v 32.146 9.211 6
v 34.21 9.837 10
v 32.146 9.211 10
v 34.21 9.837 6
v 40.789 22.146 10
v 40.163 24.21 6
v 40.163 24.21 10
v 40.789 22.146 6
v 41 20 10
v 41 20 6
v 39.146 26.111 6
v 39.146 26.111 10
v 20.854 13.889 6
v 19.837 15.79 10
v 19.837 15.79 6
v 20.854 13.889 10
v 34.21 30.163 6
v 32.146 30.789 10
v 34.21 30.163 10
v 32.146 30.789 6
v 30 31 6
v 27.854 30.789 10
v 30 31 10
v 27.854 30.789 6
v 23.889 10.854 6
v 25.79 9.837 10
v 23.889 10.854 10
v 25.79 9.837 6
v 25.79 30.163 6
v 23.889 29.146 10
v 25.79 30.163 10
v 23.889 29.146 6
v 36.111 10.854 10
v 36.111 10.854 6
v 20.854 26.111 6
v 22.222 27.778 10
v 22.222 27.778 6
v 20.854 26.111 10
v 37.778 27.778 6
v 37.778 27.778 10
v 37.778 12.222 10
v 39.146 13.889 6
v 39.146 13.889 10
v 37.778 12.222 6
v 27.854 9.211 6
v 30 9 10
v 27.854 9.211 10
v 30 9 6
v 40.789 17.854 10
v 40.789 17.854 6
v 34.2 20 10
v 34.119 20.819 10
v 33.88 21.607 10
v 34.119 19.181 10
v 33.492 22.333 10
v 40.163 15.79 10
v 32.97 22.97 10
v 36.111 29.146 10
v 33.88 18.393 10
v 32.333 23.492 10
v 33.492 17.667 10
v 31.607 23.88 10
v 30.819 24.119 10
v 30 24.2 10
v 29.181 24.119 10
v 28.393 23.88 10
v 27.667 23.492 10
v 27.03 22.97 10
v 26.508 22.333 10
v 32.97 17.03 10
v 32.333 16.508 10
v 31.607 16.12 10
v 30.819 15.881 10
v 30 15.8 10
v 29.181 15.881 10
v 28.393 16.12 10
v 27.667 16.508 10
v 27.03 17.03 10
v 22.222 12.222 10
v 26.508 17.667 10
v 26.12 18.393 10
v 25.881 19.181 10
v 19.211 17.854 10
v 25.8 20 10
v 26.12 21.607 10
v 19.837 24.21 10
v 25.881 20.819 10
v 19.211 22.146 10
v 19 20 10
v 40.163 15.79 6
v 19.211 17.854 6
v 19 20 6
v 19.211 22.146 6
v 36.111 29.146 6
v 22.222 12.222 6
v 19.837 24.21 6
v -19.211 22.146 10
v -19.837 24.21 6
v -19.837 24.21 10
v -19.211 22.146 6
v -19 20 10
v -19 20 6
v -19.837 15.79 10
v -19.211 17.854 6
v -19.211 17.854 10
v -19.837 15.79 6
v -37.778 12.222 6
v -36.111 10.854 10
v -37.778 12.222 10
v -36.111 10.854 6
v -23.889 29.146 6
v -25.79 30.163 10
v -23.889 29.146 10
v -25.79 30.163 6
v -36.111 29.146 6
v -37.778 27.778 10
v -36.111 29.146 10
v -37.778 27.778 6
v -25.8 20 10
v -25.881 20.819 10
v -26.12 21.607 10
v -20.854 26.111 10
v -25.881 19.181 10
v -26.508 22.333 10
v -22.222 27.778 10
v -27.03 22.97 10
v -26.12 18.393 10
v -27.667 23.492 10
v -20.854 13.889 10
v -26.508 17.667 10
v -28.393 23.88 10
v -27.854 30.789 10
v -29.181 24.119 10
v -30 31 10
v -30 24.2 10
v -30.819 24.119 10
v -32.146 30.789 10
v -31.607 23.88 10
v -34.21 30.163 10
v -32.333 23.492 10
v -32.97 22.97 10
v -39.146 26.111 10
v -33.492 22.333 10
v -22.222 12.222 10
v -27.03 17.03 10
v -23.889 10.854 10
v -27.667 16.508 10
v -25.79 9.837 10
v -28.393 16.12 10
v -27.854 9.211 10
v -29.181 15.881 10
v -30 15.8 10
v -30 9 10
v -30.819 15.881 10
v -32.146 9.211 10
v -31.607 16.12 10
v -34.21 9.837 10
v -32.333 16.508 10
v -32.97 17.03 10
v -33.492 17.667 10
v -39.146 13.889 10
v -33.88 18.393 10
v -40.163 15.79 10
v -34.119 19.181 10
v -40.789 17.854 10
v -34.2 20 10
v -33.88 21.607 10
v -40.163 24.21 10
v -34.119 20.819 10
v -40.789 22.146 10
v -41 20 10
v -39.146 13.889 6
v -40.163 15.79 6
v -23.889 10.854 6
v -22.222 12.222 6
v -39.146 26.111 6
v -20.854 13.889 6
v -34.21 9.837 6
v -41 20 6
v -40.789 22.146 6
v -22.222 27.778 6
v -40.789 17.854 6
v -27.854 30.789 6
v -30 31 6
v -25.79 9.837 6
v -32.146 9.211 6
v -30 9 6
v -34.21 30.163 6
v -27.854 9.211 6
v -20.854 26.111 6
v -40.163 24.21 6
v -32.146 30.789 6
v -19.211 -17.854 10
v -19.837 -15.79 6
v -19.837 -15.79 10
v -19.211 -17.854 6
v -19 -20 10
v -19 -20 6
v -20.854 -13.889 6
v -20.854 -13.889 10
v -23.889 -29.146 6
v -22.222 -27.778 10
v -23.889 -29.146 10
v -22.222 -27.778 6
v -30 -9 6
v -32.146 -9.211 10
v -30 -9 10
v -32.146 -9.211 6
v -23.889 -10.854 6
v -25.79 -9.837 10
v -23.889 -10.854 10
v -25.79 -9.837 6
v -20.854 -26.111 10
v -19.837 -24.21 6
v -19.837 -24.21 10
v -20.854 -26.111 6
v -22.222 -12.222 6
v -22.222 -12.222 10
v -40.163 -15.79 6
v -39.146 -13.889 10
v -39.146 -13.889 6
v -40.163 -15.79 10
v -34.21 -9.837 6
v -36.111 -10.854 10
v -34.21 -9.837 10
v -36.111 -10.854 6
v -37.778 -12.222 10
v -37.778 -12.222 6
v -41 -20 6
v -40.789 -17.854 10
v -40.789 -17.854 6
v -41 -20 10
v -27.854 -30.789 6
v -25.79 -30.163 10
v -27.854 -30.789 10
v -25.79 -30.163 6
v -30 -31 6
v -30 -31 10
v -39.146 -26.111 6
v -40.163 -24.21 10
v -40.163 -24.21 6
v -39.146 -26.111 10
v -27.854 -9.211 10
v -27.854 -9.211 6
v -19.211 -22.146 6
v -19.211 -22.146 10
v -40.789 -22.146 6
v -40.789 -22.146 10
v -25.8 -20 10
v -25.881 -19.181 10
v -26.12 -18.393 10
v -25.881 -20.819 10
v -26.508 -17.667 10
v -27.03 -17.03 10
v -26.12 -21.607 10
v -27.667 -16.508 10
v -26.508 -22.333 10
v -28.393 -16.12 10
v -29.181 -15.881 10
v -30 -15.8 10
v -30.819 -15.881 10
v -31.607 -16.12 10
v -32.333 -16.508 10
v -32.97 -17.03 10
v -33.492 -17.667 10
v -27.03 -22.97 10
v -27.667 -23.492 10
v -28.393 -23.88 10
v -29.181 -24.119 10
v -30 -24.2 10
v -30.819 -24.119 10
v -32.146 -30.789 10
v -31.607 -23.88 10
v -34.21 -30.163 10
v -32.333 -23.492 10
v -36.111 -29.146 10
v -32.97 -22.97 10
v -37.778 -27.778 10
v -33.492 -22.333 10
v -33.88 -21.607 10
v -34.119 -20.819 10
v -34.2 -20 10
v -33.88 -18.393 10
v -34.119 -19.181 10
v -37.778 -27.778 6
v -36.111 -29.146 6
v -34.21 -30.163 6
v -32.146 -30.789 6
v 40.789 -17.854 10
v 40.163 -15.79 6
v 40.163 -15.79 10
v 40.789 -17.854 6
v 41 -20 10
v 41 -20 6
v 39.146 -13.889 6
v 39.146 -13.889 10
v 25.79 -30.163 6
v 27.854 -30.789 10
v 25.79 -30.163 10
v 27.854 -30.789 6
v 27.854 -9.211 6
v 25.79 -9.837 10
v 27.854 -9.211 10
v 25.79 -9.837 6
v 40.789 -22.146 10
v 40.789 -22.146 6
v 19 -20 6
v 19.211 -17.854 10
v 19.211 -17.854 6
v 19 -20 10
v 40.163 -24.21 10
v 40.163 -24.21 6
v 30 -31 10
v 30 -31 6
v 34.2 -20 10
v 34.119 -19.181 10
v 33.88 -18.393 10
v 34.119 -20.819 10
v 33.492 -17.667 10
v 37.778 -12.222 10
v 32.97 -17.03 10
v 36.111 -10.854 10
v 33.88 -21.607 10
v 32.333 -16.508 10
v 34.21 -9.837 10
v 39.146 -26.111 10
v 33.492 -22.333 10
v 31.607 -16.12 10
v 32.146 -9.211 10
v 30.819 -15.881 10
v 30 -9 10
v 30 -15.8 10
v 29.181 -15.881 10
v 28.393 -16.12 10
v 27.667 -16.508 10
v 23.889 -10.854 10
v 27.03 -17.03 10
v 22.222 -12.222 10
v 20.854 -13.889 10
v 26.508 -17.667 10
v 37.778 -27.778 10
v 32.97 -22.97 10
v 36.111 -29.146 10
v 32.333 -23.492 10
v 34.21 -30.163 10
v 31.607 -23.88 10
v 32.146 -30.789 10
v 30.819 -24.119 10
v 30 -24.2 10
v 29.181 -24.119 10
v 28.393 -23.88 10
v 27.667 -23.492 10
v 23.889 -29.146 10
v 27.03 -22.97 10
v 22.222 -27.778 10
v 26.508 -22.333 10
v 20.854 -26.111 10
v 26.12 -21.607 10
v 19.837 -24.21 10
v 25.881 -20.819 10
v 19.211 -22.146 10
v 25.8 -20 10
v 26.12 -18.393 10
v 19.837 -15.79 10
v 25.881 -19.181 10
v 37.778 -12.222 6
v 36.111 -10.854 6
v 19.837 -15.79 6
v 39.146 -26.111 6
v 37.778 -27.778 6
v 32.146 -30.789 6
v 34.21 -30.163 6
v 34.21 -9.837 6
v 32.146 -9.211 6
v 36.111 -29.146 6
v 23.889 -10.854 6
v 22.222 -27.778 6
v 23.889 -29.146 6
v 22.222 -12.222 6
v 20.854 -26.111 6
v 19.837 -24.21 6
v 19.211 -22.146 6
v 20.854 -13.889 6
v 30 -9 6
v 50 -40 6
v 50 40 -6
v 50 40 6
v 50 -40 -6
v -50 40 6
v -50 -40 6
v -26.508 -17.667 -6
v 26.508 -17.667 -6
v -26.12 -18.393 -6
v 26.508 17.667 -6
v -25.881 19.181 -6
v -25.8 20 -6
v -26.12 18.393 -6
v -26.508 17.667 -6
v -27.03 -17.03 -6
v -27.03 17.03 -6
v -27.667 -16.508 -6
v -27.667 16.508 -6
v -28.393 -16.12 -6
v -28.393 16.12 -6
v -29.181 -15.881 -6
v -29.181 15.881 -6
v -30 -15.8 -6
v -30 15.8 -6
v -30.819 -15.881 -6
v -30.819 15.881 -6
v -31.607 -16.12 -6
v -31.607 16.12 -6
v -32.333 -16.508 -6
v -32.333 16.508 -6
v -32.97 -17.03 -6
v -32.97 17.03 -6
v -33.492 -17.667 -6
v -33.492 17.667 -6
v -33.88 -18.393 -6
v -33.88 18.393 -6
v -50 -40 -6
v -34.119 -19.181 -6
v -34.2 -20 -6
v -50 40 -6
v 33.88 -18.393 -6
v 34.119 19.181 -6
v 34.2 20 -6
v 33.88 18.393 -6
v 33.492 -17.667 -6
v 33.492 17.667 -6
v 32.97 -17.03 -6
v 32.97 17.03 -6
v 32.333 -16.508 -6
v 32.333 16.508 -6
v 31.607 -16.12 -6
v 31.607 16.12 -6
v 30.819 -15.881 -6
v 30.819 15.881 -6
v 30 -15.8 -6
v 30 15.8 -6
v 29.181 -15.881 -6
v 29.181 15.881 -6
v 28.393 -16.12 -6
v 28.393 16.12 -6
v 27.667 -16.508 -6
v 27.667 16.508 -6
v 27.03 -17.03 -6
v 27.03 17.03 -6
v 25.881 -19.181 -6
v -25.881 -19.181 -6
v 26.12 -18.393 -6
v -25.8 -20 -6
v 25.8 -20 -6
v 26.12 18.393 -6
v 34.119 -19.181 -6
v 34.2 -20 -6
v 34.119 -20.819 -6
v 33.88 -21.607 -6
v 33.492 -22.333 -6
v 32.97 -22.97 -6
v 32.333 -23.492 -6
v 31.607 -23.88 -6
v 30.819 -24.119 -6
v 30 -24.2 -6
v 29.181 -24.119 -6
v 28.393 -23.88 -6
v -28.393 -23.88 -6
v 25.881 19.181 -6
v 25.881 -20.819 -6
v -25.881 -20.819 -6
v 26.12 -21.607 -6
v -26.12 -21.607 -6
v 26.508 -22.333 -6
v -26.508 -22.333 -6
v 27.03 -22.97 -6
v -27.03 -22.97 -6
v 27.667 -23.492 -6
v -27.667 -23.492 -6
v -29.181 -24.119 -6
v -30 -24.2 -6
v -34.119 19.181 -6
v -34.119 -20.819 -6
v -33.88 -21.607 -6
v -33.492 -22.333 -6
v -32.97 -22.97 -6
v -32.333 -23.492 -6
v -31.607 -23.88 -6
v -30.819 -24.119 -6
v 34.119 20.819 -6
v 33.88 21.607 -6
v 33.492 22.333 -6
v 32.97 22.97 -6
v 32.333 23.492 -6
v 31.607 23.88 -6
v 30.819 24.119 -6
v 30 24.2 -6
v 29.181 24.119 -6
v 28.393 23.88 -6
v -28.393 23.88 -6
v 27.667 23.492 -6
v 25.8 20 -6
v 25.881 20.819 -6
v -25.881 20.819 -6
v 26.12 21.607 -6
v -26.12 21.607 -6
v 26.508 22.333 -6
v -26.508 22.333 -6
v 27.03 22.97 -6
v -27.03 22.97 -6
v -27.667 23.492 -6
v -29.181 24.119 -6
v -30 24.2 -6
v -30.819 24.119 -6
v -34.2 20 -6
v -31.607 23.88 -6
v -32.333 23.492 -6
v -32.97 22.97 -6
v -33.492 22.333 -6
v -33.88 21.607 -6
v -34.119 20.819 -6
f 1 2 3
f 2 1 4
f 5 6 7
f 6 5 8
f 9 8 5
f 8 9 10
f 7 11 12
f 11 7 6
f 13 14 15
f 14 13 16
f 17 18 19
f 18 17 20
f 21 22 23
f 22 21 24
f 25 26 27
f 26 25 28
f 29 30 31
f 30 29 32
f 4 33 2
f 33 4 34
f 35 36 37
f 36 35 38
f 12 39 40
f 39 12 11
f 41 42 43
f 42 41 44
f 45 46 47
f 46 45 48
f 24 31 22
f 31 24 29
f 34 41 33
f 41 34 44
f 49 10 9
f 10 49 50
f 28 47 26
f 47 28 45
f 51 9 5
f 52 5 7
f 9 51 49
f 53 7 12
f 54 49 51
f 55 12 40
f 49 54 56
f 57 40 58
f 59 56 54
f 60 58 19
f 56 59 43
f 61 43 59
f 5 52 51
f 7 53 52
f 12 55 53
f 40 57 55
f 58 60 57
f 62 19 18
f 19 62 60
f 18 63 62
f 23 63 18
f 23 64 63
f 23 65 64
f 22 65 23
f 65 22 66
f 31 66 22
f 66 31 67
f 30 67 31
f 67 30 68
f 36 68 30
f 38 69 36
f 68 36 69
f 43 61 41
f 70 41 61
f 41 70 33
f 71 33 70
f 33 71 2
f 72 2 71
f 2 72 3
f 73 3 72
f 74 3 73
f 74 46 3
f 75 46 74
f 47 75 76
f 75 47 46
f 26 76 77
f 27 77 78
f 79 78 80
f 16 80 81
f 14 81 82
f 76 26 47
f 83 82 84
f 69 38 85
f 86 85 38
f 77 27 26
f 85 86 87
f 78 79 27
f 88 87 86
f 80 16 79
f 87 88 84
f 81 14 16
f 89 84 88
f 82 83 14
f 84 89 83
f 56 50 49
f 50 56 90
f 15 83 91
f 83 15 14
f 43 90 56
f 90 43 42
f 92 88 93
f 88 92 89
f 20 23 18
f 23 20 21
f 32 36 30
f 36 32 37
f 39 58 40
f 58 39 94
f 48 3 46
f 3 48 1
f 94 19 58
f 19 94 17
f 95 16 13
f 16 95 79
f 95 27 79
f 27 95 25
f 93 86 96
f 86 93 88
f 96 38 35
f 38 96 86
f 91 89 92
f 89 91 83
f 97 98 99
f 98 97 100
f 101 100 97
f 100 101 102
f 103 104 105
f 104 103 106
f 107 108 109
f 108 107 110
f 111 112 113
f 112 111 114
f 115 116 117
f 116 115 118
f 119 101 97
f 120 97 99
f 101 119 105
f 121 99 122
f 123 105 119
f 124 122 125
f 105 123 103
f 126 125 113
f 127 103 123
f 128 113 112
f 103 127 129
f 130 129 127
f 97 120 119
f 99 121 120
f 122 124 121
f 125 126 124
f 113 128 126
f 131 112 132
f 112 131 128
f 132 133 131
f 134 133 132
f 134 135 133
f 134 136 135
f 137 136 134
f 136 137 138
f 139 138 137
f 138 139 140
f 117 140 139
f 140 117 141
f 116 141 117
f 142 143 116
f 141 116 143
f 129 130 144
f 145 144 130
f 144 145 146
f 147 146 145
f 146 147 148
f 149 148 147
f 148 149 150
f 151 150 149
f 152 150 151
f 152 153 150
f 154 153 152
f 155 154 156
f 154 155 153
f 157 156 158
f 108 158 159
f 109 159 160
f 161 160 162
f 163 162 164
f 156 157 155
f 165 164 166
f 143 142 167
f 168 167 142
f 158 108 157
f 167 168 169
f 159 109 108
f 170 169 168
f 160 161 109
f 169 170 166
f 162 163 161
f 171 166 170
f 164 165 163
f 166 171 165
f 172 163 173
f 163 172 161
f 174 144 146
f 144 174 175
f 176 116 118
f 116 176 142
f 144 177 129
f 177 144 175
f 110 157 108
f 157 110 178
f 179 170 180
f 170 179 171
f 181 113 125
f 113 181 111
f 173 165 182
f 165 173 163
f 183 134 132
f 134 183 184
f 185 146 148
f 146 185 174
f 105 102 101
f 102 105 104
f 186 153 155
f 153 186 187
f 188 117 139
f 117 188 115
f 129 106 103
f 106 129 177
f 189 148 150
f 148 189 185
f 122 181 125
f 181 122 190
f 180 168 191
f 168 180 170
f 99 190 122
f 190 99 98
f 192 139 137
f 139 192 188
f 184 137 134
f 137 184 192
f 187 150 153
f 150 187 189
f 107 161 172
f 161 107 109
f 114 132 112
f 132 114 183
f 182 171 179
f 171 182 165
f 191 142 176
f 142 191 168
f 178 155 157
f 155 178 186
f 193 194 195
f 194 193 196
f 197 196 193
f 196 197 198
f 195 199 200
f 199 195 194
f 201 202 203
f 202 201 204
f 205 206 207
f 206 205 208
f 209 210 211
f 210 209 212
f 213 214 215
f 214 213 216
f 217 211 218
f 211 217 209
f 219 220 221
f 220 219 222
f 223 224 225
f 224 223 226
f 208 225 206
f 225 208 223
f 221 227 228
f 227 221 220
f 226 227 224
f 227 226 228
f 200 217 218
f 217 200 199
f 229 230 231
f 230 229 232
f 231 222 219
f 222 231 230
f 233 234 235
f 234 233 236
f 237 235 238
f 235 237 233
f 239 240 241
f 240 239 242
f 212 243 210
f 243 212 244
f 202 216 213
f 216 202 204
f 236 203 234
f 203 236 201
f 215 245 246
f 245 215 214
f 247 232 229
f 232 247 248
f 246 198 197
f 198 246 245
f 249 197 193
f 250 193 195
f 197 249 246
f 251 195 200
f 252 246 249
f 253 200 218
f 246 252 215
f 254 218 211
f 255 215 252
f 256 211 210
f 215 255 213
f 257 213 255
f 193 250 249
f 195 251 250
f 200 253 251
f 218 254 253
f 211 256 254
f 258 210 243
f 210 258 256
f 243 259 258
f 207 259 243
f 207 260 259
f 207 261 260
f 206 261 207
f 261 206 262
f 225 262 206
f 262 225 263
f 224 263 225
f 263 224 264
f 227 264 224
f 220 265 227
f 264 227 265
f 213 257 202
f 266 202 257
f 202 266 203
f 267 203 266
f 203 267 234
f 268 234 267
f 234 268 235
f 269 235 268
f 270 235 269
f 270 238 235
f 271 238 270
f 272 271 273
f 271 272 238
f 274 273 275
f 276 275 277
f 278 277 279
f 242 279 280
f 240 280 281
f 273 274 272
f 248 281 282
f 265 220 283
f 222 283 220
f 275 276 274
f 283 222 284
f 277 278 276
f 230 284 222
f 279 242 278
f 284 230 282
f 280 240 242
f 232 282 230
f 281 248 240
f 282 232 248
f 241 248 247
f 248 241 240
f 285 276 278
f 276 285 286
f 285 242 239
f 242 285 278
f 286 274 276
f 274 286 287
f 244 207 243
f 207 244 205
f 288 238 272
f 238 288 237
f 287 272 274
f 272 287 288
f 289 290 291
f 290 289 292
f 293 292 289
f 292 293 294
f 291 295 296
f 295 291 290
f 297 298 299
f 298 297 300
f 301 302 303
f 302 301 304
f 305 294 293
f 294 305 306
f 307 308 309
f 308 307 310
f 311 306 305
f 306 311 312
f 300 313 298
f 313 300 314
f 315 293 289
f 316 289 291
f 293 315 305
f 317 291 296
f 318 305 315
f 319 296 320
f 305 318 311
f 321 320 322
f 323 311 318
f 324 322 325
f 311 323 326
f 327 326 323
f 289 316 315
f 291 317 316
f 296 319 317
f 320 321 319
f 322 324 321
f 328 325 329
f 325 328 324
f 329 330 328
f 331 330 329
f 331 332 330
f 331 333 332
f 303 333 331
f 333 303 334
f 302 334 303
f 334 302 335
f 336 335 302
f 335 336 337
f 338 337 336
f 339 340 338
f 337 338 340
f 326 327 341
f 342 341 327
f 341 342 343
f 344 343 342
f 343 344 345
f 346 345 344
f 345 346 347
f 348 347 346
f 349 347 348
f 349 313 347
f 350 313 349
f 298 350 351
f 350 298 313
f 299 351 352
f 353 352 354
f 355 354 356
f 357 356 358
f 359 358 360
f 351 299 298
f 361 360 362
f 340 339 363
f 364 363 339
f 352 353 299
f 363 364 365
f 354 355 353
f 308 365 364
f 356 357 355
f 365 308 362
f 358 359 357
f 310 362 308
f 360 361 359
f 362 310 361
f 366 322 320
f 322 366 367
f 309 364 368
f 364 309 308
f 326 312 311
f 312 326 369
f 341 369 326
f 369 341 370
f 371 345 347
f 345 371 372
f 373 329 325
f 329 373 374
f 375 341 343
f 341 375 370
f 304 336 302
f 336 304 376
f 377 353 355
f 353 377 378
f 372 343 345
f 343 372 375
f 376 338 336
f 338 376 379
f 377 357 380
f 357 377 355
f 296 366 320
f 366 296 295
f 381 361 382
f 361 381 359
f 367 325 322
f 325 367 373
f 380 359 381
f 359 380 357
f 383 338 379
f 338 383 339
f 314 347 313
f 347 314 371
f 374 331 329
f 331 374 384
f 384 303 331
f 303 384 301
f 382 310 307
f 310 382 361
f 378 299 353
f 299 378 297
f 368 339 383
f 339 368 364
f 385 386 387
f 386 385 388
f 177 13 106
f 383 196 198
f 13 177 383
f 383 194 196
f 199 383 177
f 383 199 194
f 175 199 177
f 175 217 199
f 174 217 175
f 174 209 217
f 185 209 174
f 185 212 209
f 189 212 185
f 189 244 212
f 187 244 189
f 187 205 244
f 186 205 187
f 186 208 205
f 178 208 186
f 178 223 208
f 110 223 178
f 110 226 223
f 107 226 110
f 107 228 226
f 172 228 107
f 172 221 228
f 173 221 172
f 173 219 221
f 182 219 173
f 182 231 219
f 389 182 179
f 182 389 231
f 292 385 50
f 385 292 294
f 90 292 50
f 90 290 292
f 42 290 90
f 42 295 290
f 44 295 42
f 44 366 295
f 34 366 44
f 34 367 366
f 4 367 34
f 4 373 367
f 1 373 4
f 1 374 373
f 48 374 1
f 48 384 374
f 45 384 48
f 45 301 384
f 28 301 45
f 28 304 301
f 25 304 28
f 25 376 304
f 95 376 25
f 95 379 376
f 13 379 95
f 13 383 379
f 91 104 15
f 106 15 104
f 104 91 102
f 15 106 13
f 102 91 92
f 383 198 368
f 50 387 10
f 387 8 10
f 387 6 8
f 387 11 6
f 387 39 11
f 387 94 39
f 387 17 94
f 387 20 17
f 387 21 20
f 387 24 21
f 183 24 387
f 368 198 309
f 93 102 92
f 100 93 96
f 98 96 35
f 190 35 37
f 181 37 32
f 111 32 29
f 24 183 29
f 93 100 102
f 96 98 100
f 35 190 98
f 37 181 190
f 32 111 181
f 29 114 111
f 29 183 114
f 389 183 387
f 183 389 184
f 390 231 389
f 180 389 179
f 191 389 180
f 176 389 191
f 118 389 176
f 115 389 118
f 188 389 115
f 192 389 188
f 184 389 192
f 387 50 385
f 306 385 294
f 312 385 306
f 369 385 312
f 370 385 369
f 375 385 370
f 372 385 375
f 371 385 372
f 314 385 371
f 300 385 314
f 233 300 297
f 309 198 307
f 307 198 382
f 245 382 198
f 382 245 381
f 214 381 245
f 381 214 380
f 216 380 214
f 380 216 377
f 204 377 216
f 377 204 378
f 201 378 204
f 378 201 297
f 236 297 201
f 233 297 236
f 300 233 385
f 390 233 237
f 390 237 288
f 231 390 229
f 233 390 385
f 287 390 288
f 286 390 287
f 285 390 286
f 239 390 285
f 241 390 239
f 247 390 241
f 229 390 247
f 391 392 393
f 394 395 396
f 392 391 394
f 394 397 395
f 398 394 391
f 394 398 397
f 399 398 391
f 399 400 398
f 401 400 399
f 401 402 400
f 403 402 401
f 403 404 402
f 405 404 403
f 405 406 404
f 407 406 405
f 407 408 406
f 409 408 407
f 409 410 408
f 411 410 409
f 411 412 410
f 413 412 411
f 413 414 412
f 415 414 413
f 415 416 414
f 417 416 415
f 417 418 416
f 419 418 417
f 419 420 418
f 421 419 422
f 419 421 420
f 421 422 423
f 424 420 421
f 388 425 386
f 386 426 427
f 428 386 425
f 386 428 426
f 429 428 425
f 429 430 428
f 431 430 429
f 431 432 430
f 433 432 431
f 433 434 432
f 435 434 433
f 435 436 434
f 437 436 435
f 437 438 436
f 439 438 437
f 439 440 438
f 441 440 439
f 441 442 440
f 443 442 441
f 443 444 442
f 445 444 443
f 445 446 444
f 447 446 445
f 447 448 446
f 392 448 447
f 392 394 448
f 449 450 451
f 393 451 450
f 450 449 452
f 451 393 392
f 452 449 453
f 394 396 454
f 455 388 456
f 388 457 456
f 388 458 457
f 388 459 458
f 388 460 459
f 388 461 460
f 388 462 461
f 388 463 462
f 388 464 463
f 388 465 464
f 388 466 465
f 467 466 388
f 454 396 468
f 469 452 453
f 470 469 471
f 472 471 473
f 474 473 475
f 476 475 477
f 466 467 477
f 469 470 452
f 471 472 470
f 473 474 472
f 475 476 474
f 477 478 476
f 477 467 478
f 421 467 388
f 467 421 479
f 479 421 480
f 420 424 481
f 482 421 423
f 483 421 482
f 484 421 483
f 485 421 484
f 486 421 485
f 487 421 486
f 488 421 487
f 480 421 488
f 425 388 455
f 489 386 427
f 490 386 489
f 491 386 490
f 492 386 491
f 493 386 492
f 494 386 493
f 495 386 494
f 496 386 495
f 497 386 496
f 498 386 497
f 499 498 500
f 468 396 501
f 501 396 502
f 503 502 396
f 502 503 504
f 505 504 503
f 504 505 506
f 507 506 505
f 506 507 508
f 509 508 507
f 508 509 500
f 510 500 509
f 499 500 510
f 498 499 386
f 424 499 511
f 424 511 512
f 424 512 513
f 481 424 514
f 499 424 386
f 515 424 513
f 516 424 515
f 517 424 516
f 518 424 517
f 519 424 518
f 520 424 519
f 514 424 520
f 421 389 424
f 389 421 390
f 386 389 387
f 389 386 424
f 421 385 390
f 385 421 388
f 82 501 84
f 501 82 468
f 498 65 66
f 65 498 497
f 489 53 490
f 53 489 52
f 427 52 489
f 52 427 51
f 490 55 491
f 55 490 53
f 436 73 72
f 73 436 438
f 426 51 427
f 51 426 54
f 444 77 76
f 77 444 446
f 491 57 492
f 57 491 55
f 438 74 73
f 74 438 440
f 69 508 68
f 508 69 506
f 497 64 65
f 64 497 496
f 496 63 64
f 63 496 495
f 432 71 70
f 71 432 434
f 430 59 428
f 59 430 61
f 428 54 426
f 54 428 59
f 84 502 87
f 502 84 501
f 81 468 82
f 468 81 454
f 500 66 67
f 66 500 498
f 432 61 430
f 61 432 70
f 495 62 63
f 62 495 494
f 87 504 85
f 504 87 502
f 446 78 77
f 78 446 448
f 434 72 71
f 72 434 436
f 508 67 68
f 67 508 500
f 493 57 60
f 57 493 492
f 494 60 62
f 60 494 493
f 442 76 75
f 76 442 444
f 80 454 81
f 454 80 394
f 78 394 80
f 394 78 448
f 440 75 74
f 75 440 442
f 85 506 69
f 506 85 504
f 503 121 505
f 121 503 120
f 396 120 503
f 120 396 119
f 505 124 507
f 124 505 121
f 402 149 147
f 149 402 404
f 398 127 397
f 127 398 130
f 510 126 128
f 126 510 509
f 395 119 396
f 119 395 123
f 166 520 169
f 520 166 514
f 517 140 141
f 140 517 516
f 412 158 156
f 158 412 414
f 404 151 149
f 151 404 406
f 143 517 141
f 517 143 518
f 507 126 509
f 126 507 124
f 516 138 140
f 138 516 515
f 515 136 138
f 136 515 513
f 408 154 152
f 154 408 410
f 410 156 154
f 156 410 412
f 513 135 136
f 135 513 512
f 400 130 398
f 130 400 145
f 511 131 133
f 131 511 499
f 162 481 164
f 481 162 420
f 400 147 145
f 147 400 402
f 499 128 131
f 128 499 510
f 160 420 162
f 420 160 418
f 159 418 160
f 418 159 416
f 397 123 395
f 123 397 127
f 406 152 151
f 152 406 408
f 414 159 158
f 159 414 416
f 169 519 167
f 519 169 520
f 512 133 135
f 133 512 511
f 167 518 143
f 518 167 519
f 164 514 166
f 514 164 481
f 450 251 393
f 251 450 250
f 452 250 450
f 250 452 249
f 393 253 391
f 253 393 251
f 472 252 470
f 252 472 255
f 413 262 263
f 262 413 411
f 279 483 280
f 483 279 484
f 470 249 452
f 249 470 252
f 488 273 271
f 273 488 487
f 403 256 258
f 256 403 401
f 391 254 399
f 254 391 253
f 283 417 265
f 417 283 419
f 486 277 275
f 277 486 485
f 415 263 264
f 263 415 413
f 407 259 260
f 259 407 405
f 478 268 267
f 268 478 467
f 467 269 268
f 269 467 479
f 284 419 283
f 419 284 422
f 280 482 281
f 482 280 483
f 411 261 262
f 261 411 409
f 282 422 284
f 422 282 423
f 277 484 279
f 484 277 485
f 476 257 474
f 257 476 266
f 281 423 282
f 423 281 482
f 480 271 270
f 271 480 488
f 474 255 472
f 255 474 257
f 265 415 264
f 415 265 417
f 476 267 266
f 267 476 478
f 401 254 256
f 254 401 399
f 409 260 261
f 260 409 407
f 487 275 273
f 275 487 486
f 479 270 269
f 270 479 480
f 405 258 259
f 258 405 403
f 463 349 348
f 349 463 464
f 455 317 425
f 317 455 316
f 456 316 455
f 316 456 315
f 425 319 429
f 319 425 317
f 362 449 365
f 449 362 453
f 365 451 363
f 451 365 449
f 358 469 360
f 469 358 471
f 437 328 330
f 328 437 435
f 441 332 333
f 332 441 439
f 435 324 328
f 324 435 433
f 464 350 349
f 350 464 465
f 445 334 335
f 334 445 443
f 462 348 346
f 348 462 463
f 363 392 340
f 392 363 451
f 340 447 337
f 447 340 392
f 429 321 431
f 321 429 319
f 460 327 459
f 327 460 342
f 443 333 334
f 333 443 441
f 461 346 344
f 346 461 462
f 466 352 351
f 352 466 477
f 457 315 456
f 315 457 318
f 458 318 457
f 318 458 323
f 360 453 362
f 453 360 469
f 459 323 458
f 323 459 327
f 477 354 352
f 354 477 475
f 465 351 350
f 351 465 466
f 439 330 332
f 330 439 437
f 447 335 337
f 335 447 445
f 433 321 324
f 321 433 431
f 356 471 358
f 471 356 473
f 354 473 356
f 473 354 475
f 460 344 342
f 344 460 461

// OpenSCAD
$fn = 32;

// ----------------------------------------------------------------------
// Anchor pads 100 x 80 x 16
// four corner bosses with anchor holes
// ----------------------------------------------------------------------

// --- parameters (mm) ---
plate = [100, 80, 12];  // base plate size (x, y, z)
pads = 4;               // boss count, one per corner
edge = 20;              // boss centre offset from the plate edge
boss_d = 22;            // boss diameter
boss_h = 4;             // boss height above the base plate
hole_d = 8.4;           // hole diameter

// --- derived feature positions (mm) ---
height = plate[2] + boss_h;      // = 16   overall height of the part
corner_x = plate[0] / 2 - edge;  // = 30   boss centre X
corner_y = plate[1] / 2 - edge;  // = 20   boss centre Y
feature_centers = [
  [corner_x, corner_y],
  [-corner_x, corner_y],
  [-corner_x, -corner_y],
  [corner_x, -corner_y]
];   // boss centres, anchor holes are drilled there

// base plate, four bosses standing on it, anchor holes all the way through
difference() {
  union() {
    cube(plate, center = true);
    for (centre = feature_centers)
      translate([centre[0], centre[1], plate[2] / 2 - 1])
        cylinder(d = boss_d, h = boss_h + 1);
  }
  for (centre = feature_centers)
    translate([centre[0], centre[1], -height])
      cylinder(d = hole_d, h = 2 * height + 2);  // through boss and plate
}
